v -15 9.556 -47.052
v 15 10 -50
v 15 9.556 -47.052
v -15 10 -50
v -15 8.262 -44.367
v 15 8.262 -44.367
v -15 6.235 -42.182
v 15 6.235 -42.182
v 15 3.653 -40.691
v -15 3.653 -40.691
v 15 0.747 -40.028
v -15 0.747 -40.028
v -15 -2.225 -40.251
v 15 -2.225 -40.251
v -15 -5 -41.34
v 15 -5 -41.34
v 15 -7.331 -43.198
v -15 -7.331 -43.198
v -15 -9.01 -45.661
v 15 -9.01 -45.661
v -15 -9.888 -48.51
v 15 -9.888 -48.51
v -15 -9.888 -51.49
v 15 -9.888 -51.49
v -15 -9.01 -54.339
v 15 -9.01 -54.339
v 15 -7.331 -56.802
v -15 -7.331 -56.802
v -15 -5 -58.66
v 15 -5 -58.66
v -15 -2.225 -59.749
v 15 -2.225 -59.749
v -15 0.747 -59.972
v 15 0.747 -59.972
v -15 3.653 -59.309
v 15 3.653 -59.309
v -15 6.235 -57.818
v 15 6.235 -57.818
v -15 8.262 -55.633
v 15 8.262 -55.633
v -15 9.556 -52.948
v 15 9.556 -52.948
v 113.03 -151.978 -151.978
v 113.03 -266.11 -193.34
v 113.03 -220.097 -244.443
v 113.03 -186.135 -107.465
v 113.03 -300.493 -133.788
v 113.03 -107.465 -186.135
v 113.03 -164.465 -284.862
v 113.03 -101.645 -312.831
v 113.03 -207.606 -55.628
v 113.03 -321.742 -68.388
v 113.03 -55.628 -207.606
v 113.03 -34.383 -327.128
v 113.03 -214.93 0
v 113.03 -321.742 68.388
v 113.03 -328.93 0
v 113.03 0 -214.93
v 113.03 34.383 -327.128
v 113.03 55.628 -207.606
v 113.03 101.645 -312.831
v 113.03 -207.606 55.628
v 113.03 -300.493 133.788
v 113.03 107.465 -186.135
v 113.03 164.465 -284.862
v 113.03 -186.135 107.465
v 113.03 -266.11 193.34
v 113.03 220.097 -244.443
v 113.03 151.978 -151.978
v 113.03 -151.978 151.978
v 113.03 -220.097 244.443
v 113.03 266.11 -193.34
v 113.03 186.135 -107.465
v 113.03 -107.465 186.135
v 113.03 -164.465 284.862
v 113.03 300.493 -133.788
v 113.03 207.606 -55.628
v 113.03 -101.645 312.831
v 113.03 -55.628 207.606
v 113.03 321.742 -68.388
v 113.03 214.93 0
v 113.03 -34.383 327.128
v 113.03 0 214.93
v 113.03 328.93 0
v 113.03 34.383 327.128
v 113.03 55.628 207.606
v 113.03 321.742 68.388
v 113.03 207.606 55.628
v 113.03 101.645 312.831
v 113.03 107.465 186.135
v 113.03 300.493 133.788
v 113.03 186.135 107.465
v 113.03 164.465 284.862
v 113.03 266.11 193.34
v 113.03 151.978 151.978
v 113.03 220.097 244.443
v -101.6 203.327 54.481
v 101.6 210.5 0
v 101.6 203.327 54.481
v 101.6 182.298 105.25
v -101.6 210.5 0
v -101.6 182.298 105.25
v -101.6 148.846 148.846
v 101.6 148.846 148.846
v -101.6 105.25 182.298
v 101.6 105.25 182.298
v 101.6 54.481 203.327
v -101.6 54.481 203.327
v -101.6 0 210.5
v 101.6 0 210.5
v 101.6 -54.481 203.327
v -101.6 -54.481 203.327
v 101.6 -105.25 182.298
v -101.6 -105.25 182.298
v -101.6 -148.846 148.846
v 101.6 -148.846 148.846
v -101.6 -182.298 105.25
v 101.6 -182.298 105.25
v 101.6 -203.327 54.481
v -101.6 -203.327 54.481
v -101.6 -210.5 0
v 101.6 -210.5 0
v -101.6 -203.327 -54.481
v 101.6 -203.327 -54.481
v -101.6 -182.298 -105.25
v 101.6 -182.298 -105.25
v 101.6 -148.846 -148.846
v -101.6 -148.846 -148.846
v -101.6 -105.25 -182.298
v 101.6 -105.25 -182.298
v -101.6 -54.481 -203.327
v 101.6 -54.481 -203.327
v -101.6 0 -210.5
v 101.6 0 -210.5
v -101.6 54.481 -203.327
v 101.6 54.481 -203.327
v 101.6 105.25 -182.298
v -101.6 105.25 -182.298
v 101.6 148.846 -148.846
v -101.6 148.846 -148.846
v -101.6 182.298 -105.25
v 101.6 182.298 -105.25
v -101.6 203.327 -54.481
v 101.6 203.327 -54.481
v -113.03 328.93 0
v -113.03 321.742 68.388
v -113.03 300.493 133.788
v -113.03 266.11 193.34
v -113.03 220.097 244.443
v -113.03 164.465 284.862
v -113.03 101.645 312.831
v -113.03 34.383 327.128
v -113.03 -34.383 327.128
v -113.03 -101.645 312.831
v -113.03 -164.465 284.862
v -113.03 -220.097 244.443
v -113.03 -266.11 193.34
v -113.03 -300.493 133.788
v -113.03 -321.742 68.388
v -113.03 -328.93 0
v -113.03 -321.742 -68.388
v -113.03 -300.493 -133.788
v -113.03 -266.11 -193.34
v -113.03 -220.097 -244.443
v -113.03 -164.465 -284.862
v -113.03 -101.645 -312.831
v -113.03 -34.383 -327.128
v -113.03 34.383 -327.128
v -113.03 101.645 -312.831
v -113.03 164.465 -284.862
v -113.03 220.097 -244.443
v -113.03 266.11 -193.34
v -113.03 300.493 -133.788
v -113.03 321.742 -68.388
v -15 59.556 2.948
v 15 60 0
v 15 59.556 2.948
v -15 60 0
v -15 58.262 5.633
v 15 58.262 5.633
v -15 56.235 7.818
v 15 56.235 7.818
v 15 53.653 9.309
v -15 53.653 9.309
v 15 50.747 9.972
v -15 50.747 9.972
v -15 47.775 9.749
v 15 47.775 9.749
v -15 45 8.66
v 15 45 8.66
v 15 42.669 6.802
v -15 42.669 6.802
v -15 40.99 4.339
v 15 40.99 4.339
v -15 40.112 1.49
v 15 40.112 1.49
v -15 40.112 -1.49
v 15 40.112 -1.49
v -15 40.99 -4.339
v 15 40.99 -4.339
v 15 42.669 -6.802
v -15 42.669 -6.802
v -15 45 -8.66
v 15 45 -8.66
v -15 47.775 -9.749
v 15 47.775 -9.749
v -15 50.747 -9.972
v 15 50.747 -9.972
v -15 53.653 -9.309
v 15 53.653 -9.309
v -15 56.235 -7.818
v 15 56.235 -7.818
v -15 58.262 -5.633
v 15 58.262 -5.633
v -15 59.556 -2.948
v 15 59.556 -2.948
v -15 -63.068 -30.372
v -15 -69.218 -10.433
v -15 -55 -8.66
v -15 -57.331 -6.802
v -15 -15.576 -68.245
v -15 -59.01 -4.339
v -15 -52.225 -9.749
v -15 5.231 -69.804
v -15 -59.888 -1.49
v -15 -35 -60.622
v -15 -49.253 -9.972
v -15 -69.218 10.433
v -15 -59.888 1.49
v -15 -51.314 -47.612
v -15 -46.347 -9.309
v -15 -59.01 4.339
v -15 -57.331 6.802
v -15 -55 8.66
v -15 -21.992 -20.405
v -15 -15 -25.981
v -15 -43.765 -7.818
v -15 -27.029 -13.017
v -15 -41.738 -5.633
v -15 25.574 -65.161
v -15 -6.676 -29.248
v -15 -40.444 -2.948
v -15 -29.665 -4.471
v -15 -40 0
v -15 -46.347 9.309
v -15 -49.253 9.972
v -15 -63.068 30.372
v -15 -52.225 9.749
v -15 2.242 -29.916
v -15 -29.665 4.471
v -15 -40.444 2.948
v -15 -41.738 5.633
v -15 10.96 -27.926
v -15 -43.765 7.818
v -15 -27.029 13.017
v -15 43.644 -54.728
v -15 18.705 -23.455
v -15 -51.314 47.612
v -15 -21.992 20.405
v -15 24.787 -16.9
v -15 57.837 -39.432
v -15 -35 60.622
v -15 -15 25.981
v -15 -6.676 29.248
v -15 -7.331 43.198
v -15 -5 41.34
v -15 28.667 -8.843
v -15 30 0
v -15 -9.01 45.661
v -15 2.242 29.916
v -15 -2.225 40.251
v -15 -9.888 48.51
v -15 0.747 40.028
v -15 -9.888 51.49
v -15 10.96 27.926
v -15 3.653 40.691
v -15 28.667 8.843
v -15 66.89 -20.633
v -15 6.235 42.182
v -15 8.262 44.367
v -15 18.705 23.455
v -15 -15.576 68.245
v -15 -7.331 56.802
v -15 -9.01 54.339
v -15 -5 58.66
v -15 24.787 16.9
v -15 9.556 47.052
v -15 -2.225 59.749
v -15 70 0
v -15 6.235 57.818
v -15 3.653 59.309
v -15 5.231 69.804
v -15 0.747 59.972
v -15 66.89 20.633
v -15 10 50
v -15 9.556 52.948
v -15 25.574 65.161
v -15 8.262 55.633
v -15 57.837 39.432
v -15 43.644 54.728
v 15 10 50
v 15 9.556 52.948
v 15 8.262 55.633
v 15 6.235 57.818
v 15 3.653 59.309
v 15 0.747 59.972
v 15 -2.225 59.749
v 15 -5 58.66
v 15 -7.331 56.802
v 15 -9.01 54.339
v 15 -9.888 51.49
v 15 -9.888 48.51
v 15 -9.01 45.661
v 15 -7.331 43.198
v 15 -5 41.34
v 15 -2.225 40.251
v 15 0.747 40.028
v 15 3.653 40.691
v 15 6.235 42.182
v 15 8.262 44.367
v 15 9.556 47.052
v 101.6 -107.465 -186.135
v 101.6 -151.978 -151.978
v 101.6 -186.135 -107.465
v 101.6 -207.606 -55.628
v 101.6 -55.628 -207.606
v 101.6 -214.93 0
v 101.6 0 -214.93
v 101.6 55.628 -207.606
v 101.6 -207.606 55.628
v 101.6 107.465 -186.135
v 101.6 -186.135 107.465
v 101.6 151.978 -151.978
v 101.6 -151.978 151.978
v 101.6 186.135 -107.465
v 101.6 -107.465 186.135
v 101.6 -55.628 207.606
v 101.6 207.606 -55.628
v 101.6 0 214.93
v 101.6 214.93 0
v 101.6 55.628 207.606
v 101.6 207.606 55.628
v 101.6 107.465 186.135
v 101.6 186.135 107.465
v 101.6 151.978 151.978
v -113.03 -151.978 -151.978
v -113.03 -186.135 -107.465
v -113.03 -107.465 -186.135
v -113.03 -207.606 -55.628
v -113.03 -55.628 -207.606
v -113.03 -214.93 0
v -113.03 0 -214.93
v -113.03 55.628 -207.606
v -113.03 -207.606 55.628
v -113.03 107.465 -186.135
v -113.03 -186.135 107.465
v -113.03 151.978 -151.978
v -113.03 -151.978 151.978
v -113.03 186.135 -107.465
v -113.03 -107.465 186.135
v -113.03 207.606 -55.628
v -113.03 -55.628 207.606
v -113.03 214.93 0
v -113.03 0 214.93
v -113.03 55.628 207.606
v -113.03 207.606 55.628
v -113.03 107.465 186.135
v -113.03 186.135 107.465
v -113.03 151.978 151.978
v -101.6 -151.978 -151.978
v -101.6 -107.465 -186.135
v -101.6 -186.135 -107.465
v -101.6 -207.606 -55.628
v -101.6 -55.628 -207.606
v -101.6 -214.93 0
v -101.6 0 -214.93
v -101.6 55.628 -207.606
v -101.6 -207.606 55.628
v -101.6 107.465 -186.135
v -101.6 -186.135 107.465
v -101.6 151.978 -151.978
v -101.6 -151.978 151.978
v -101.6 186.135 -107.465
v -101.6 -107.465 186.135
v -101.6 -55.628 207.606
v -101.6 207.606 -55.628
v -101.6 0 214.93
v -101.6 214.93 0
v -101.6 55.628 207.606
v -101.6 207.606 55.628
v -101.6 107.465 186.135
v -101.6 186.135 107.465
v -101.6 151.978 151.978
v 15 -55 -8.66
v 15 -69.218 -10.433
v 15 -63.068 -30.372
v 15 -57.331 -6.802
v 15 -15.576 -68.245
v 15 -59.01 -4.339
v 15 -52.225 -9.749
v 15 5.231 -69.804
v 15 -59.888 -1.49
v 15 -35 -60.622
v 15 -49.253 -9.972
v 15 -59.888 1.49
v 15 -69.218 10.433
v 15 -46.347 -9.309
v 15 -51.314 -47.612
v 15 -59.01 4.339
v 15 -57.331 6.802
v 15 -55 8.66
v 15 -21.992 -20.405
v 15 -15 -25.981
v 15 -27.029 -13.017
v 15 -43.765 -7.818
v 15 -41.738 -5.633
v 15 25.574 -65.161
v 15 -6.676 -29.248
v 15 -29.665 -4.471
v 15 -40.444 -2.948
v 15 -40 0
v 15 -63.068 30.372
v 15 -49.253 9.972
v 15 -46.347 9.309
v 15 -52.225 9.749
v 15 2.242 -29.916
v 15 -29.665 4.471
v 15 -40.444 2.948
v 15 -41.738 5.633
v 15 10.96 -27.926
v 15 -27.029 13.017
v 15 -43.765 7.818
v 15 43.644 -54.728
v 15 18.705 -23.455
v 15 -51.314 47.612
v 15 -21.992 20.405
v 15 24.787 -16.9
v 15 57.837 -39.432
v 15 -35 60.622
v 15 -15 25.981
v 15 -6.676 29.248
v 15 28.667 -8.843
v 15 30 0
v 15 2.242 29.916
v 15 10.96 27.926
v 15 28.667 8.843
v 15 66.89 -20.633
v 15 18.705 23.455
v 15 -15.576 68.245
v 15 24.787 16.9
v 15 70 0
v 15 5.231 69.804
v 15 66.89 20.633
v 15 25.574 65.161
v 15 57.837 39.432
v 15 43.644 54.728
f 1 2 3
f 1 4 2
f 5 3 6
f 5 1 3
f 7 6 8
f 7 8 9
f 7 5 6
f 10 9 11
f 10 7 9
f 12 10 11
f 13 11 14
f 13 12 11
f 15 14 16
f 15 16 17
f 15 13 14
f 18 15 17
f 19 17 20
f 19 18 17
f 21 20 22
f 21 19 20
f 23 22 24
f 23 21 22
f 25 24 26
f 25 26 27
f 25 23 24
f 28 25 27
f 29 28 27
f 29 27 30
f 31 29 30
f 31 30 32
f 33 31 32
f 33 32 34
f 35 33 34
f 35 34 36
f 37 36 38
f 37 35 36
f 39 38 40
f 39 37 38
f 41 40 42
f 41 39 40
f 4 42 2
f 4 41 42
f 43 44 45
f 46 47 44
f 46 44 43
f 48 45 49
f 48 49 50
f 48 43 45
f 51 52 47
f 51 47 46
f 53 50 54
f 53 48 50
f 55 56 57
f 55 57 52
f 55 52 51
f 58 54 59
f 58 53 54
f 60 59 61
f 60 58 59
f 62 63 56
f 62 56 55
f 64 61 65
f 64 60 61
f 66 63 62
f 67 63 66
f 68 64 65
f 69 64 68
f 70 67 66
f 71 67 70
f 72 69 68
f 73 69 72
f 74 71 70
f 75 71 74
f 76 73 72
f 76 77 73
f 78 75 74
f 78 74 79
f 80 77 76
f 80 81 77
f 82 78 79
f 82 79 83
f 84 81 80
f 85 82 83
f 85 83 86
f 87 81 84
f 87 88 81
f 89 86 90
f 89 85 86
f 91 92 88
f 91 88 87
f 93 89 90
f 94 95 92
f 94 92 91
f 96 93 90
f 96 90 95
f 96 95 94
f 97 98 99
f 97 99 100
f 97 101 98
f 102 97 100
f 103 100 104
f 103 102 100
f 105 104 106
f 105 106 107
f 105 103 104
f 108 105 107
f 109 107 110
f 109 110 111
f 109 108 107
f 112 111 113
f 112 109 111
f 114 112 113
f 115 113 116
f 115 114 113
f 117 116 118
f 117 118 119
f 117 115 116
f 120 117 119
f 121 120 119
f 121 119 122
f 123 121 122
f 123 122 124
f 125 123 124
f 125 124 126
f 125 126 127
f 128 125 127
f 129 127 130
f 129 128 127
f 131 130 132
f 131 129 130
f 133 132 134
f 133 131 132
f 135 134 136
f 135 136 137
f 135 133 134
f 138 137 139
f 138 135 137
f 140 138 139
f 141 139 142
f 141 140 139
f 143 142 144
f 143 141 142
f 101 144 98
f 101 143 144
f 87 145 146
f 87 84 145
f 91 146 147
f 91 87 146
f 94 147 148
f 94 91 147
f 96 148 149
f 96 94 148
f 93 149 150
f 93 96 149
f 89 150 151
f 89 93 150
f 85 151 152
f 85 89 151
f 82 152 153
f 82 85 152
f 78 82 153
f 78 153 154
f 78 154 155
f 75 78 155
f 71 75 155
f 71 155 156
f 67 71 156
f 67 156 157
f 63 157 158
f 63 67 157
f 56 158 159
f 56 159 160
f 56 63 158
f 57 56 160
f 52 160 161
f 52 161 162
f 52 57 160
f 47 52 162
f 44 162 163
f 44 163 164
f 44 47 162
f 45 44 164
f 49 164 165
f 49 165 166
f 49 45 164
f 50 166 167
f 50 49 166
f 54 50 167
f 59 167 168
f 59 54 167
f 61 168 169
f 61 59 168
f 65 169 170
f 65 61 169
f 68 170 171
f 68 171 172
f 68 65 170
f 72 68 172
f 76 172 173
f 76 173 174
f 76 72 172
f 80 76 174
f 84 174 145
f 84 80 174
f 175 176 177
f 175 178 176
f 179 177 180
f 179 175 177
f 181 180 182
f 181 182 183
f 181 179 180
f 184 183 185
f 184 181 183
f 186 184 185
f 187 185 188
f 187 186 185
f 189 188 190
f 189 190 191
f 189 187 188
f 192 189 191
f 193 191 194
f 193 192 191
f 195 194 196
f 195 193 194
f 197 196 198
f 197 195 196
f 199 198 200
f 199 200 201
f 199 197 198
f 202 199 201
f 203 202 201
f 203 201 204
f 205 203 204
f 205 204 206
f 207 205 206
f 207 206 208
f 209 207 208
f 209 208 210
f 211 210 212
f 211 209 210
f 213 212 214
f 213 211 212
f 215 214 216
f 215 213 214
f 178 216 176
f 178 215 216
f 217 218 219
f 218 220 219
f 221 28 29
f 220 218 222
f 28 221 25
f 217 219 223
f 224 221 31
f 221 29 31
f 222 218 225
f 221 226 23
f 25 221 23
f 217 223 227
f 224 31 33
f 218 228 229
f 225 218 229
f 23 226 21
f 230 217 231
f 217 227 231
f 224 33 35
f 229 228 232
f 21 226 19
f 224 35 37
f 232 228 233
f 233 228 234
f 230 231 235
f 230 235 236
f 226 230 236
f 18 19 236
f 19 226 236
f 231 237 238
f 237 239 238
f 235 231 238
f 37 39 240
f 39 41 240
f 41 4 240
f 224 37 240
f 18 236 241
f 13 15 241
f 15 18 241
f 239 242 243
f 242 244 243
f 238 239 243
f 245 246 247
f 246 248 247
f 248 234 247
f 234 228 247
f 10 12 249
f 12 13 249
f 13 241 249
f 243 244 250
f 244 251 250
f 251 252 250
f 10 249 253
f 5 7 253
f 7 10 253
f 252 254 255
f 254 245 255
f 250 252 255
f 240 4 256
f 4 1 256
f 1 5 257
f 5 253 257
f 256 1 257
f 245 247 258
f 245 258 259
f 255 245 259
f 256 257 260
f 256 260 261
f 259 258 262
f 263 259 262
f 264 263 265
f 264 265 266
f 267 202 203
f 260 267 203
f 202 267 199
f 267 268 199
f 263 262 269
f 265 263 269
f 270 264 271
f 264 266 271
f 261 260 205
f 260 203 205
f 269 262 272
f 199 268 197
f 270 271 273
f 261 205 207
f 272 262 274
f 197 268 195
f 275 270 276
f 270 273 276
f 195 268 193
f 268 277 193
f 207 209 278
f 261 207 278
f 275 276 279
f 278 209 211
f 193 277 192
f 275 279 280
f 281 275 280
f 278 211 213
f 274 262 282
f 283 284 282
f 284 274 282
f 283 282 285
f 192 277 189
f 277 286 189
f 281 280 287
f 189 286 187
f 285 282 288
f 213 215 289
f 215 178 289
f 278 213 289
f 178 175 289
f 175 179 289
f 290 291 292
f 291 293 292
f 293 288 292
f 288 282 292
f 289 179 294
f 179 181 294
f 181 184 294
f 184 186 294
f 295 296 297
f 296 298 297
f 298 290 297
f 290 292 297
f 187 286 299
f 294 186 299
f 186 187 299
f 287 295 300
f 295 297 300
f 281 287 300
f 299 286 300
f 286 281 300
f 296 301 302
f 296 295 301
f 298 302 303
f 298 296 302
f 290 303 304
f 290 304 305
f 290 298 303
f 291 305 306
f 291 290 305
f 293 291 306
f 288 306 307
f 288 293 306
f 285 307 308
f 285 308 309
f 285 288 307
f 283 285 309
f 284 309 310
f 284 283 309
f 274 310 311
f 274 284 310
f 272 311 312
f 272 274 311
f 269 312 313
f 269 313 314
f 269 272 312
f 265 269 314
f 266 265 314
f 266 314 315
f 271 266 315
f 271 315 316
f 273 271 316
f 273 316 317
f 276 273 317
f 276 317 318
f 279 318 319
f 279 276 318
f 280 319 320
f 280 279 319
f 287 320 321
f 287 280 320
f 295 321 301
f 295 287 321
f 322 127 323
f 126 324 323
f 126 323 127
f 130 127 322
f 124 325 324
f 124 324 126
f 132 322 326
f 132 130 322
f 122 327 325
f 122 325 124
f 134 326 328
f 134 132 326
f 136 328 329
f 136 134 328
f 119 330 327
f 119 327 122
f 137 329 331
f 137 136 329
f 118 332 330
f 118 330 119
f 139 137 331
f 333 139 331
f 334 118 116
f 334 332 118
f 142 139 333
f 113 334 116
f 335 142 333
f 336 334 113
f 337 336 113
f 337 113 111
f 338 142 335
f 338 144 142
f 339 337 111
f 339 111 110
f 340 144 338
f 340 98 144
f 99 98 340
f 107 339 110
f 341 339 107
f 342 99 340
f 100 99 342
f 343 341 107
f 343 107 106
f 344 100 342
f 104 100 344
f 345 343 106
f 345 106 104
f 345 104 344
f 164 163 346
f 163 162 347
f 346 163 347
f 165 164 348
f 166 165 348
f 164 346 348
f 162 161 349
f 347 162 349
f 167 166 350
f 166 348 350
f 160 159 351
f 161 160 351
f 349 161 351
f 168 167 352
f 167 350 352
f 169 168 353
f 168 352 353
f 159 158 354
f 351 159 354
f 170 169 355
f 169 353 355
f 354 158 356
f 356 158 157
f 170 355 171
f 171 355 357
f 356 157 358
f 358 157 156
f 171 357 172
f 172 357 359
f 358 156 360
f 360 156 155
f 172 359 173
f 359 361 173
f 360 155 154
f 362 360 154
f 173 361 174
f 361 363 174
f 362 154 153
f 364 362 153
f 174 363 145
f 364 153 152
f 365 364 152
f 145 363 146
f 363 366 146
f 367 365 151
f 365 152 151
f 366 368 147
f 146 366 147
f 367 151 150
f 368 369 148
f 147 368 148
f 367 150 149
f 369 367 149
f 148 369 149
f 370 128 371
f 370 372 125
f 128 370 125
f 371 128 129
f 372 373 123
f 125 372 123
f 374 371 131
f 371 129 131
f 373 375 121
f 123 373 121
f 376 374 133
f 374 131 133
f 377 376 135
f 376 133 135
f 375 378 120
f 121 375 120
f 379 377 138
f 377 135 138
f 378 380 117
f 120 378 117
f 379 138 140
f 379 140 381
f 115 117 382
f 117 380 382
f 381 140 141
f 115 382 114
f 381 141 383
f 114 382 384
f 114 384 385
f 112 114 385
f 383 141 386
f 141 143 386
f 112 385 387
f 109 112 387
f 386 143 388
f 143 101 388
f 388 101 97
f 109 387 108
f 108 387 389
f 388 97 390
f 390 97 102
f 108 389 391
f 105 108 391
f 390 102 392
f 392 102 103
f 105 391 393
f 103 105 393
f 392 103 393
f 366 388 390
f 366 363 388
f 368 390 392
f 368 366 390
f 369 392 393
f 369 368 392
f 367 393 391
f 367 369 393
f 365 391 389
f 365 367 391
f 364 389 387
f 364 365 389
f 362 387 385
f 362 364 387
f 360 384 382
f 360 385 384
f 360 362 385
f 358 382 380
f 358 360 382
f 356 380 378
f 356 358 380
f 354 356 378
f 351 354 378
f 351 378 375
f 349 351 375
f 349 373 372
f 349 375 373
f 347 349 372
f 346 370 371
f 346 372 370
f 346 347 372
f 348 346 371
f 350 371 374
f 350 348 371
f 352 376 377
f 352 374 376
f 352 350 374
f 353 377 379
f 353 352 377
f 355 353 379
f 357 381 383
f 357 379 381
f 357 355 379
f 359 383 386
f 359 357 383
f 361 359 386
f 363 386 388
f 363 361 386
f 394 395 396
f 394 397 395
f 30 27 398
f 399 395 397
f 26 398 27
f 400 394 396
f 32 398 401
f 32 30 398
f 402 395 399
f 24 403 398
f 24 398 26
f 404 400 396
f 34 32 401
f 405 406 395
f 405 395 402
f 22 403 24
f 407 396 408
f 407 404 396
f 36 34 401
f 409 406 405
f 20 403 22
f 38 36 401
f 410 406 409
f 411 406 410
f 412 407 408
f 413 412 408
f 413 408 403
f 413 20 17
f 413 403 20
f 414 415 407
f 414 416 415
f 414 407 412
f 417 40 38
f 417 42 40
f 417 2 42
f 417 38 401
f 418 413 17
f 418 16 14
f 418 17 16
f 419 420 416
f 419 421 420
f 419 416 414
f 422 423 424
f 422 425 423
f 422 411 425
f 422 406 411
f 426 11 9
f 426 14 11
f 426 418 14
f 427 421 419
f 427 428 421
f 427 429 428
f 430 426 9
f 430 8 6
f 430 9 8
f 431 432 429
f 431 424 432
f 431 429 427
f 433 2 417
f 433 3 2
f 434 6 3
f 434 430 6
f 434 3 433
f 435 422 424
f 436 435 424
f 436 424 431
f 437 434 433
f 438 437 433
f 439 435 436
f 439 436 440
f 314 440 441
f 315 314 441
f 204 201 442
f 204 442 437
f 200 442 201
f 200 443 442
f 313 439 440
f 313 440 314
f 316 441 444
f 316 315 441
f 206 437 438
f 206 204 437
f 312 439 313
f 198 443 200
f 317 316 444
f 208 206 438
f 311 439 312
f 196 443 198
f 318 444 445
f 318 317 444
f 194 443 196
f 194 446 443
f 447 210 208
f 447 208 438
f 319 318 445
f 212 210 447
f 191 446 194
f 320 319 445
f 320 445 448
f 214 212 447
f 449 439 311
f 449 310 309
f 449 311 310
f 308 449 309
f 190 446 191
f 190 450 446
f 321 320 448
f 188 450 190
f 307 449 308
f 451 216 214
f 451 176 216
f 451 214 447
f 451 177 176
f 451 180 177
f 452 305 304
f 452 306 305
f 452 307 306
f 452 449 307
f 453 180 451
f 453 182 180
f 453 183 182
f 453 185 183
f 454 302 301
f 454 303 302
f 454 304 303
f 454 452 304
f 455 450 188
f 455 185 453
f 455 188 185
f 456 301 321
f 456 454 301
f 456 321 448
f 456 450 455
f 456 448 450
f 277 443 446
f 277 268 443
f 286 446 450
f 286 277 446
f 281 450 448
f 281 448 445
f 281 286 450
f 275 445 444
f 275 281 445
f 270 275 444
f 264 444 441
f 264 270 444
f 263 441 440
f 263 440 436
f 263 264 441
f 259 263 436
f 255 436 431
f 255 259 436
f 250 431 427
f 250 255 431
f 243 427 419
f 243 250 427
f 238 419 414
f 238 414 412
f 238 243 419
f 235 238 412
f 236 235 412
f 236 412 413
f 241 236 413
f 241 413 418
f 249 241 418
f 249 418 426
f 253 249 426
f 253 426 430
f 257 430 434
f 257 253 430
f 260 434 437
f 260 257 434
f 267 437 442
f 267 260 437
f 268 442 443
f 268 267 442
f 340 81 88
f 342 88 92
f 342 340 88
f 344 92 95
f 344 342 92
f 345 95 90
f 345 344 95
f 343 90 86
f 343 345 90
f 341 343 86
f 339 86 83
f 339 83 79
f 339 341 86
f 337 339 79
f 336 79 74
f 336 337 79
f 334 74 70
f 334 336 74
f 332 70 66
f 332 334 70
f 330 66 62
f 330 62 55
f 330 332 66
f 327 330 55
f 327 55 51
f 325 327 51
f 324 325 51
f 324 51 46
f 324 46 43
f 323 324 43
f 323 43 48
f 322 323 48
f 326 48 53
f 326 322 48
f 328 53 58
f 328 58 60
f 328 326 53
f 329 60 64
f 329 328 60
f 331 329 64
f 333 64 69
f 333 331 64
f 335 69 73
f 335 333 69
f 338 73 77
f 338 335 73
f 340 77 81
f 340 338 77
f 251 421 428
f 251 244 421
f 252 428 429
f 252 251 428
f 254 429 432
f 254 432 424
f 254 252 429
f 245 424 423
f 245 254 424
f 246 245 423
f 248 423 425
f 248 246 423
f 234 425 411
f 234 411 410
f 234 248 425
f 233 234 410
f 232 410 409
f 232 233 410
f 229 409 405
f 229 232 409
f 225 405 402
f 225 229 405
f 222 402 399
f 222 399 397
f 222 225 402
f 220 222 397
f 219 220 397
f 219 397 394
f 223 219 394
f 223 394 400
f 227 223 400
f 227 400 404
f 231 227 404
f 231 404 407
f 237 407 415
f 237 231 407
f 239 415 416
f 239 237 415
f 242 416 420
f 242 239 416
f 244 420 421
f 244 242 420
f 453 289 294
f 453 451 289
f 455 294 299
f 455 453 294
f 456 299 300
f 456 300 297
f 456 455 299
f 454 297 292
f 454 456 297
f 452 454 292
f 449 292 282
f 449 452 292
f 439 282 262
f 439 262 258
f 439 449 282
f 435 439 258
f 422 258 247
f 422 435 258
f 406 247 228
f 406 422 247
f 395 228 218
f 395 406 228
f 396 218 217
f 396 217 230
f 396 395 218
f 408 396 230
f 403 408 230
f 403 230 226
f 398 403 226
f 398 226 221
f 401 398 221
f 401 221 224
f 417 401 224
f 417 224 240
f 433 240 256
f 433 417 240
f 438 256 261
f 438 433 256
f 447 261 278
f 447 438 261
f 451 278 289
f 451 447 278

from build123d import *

# Parameters (mm, degrees)
F0_R     = 215.5
F0_R_2   = 210.5
F1_DEPTH = 101.6
F2_R     = 70
F2_R_2   = 10
F2_R_3   = 30
F3_DEPTH = 15
F4_R     = 328.93
F4_R_2   = 214.93
F5_DEPTH = 113.03


with BuildPart() as f1:
    # F0 (on Right) → F1 (new body, symmetric)
    with BuildSketch(Plane.YZ):
        Circle(F0_R)
        Circle(F0_R_2, mode=Mode.SUBTRACT)
    extrude(amount=F1_DEPTH, both=True)

    # F4 (on Right) → F5 (join, symmetric)
    with BuildSketch(Plane.YZ):
        Circle(F4_R)
        Circle(F4_R_2, mode=Mode.SUBTRACT)
    extrude(amount=F5_DEPTH, both=True)


with BuildPart() as f3:
    # F2 (on Right) → F3 (new body, symmetric)
    with BuildSketch(Plane.YZ):
        Circle(F2_R)
        with Locations((0, -50)):
            Circle(F2_R_2, mode=Mode.SUBTRACT)
        with Locations((-50, 0)):
            Circle(F2_R_2, mode=Mode.SUBTRACT)
        Circle(F2_R_3, mode=Mode.SUBTRACT)
        with Locations((50, 0)):
            Circle(F2_R_2, mode=Mode.SUBTRACT)
        with Locations((0, 50)):
            Circle(F2_R_2, mode=Mode.SUBTRACT)
    extrude(amount=F3_DEPTH, both=True)


solid = Compound([f1.part, f3.part])
